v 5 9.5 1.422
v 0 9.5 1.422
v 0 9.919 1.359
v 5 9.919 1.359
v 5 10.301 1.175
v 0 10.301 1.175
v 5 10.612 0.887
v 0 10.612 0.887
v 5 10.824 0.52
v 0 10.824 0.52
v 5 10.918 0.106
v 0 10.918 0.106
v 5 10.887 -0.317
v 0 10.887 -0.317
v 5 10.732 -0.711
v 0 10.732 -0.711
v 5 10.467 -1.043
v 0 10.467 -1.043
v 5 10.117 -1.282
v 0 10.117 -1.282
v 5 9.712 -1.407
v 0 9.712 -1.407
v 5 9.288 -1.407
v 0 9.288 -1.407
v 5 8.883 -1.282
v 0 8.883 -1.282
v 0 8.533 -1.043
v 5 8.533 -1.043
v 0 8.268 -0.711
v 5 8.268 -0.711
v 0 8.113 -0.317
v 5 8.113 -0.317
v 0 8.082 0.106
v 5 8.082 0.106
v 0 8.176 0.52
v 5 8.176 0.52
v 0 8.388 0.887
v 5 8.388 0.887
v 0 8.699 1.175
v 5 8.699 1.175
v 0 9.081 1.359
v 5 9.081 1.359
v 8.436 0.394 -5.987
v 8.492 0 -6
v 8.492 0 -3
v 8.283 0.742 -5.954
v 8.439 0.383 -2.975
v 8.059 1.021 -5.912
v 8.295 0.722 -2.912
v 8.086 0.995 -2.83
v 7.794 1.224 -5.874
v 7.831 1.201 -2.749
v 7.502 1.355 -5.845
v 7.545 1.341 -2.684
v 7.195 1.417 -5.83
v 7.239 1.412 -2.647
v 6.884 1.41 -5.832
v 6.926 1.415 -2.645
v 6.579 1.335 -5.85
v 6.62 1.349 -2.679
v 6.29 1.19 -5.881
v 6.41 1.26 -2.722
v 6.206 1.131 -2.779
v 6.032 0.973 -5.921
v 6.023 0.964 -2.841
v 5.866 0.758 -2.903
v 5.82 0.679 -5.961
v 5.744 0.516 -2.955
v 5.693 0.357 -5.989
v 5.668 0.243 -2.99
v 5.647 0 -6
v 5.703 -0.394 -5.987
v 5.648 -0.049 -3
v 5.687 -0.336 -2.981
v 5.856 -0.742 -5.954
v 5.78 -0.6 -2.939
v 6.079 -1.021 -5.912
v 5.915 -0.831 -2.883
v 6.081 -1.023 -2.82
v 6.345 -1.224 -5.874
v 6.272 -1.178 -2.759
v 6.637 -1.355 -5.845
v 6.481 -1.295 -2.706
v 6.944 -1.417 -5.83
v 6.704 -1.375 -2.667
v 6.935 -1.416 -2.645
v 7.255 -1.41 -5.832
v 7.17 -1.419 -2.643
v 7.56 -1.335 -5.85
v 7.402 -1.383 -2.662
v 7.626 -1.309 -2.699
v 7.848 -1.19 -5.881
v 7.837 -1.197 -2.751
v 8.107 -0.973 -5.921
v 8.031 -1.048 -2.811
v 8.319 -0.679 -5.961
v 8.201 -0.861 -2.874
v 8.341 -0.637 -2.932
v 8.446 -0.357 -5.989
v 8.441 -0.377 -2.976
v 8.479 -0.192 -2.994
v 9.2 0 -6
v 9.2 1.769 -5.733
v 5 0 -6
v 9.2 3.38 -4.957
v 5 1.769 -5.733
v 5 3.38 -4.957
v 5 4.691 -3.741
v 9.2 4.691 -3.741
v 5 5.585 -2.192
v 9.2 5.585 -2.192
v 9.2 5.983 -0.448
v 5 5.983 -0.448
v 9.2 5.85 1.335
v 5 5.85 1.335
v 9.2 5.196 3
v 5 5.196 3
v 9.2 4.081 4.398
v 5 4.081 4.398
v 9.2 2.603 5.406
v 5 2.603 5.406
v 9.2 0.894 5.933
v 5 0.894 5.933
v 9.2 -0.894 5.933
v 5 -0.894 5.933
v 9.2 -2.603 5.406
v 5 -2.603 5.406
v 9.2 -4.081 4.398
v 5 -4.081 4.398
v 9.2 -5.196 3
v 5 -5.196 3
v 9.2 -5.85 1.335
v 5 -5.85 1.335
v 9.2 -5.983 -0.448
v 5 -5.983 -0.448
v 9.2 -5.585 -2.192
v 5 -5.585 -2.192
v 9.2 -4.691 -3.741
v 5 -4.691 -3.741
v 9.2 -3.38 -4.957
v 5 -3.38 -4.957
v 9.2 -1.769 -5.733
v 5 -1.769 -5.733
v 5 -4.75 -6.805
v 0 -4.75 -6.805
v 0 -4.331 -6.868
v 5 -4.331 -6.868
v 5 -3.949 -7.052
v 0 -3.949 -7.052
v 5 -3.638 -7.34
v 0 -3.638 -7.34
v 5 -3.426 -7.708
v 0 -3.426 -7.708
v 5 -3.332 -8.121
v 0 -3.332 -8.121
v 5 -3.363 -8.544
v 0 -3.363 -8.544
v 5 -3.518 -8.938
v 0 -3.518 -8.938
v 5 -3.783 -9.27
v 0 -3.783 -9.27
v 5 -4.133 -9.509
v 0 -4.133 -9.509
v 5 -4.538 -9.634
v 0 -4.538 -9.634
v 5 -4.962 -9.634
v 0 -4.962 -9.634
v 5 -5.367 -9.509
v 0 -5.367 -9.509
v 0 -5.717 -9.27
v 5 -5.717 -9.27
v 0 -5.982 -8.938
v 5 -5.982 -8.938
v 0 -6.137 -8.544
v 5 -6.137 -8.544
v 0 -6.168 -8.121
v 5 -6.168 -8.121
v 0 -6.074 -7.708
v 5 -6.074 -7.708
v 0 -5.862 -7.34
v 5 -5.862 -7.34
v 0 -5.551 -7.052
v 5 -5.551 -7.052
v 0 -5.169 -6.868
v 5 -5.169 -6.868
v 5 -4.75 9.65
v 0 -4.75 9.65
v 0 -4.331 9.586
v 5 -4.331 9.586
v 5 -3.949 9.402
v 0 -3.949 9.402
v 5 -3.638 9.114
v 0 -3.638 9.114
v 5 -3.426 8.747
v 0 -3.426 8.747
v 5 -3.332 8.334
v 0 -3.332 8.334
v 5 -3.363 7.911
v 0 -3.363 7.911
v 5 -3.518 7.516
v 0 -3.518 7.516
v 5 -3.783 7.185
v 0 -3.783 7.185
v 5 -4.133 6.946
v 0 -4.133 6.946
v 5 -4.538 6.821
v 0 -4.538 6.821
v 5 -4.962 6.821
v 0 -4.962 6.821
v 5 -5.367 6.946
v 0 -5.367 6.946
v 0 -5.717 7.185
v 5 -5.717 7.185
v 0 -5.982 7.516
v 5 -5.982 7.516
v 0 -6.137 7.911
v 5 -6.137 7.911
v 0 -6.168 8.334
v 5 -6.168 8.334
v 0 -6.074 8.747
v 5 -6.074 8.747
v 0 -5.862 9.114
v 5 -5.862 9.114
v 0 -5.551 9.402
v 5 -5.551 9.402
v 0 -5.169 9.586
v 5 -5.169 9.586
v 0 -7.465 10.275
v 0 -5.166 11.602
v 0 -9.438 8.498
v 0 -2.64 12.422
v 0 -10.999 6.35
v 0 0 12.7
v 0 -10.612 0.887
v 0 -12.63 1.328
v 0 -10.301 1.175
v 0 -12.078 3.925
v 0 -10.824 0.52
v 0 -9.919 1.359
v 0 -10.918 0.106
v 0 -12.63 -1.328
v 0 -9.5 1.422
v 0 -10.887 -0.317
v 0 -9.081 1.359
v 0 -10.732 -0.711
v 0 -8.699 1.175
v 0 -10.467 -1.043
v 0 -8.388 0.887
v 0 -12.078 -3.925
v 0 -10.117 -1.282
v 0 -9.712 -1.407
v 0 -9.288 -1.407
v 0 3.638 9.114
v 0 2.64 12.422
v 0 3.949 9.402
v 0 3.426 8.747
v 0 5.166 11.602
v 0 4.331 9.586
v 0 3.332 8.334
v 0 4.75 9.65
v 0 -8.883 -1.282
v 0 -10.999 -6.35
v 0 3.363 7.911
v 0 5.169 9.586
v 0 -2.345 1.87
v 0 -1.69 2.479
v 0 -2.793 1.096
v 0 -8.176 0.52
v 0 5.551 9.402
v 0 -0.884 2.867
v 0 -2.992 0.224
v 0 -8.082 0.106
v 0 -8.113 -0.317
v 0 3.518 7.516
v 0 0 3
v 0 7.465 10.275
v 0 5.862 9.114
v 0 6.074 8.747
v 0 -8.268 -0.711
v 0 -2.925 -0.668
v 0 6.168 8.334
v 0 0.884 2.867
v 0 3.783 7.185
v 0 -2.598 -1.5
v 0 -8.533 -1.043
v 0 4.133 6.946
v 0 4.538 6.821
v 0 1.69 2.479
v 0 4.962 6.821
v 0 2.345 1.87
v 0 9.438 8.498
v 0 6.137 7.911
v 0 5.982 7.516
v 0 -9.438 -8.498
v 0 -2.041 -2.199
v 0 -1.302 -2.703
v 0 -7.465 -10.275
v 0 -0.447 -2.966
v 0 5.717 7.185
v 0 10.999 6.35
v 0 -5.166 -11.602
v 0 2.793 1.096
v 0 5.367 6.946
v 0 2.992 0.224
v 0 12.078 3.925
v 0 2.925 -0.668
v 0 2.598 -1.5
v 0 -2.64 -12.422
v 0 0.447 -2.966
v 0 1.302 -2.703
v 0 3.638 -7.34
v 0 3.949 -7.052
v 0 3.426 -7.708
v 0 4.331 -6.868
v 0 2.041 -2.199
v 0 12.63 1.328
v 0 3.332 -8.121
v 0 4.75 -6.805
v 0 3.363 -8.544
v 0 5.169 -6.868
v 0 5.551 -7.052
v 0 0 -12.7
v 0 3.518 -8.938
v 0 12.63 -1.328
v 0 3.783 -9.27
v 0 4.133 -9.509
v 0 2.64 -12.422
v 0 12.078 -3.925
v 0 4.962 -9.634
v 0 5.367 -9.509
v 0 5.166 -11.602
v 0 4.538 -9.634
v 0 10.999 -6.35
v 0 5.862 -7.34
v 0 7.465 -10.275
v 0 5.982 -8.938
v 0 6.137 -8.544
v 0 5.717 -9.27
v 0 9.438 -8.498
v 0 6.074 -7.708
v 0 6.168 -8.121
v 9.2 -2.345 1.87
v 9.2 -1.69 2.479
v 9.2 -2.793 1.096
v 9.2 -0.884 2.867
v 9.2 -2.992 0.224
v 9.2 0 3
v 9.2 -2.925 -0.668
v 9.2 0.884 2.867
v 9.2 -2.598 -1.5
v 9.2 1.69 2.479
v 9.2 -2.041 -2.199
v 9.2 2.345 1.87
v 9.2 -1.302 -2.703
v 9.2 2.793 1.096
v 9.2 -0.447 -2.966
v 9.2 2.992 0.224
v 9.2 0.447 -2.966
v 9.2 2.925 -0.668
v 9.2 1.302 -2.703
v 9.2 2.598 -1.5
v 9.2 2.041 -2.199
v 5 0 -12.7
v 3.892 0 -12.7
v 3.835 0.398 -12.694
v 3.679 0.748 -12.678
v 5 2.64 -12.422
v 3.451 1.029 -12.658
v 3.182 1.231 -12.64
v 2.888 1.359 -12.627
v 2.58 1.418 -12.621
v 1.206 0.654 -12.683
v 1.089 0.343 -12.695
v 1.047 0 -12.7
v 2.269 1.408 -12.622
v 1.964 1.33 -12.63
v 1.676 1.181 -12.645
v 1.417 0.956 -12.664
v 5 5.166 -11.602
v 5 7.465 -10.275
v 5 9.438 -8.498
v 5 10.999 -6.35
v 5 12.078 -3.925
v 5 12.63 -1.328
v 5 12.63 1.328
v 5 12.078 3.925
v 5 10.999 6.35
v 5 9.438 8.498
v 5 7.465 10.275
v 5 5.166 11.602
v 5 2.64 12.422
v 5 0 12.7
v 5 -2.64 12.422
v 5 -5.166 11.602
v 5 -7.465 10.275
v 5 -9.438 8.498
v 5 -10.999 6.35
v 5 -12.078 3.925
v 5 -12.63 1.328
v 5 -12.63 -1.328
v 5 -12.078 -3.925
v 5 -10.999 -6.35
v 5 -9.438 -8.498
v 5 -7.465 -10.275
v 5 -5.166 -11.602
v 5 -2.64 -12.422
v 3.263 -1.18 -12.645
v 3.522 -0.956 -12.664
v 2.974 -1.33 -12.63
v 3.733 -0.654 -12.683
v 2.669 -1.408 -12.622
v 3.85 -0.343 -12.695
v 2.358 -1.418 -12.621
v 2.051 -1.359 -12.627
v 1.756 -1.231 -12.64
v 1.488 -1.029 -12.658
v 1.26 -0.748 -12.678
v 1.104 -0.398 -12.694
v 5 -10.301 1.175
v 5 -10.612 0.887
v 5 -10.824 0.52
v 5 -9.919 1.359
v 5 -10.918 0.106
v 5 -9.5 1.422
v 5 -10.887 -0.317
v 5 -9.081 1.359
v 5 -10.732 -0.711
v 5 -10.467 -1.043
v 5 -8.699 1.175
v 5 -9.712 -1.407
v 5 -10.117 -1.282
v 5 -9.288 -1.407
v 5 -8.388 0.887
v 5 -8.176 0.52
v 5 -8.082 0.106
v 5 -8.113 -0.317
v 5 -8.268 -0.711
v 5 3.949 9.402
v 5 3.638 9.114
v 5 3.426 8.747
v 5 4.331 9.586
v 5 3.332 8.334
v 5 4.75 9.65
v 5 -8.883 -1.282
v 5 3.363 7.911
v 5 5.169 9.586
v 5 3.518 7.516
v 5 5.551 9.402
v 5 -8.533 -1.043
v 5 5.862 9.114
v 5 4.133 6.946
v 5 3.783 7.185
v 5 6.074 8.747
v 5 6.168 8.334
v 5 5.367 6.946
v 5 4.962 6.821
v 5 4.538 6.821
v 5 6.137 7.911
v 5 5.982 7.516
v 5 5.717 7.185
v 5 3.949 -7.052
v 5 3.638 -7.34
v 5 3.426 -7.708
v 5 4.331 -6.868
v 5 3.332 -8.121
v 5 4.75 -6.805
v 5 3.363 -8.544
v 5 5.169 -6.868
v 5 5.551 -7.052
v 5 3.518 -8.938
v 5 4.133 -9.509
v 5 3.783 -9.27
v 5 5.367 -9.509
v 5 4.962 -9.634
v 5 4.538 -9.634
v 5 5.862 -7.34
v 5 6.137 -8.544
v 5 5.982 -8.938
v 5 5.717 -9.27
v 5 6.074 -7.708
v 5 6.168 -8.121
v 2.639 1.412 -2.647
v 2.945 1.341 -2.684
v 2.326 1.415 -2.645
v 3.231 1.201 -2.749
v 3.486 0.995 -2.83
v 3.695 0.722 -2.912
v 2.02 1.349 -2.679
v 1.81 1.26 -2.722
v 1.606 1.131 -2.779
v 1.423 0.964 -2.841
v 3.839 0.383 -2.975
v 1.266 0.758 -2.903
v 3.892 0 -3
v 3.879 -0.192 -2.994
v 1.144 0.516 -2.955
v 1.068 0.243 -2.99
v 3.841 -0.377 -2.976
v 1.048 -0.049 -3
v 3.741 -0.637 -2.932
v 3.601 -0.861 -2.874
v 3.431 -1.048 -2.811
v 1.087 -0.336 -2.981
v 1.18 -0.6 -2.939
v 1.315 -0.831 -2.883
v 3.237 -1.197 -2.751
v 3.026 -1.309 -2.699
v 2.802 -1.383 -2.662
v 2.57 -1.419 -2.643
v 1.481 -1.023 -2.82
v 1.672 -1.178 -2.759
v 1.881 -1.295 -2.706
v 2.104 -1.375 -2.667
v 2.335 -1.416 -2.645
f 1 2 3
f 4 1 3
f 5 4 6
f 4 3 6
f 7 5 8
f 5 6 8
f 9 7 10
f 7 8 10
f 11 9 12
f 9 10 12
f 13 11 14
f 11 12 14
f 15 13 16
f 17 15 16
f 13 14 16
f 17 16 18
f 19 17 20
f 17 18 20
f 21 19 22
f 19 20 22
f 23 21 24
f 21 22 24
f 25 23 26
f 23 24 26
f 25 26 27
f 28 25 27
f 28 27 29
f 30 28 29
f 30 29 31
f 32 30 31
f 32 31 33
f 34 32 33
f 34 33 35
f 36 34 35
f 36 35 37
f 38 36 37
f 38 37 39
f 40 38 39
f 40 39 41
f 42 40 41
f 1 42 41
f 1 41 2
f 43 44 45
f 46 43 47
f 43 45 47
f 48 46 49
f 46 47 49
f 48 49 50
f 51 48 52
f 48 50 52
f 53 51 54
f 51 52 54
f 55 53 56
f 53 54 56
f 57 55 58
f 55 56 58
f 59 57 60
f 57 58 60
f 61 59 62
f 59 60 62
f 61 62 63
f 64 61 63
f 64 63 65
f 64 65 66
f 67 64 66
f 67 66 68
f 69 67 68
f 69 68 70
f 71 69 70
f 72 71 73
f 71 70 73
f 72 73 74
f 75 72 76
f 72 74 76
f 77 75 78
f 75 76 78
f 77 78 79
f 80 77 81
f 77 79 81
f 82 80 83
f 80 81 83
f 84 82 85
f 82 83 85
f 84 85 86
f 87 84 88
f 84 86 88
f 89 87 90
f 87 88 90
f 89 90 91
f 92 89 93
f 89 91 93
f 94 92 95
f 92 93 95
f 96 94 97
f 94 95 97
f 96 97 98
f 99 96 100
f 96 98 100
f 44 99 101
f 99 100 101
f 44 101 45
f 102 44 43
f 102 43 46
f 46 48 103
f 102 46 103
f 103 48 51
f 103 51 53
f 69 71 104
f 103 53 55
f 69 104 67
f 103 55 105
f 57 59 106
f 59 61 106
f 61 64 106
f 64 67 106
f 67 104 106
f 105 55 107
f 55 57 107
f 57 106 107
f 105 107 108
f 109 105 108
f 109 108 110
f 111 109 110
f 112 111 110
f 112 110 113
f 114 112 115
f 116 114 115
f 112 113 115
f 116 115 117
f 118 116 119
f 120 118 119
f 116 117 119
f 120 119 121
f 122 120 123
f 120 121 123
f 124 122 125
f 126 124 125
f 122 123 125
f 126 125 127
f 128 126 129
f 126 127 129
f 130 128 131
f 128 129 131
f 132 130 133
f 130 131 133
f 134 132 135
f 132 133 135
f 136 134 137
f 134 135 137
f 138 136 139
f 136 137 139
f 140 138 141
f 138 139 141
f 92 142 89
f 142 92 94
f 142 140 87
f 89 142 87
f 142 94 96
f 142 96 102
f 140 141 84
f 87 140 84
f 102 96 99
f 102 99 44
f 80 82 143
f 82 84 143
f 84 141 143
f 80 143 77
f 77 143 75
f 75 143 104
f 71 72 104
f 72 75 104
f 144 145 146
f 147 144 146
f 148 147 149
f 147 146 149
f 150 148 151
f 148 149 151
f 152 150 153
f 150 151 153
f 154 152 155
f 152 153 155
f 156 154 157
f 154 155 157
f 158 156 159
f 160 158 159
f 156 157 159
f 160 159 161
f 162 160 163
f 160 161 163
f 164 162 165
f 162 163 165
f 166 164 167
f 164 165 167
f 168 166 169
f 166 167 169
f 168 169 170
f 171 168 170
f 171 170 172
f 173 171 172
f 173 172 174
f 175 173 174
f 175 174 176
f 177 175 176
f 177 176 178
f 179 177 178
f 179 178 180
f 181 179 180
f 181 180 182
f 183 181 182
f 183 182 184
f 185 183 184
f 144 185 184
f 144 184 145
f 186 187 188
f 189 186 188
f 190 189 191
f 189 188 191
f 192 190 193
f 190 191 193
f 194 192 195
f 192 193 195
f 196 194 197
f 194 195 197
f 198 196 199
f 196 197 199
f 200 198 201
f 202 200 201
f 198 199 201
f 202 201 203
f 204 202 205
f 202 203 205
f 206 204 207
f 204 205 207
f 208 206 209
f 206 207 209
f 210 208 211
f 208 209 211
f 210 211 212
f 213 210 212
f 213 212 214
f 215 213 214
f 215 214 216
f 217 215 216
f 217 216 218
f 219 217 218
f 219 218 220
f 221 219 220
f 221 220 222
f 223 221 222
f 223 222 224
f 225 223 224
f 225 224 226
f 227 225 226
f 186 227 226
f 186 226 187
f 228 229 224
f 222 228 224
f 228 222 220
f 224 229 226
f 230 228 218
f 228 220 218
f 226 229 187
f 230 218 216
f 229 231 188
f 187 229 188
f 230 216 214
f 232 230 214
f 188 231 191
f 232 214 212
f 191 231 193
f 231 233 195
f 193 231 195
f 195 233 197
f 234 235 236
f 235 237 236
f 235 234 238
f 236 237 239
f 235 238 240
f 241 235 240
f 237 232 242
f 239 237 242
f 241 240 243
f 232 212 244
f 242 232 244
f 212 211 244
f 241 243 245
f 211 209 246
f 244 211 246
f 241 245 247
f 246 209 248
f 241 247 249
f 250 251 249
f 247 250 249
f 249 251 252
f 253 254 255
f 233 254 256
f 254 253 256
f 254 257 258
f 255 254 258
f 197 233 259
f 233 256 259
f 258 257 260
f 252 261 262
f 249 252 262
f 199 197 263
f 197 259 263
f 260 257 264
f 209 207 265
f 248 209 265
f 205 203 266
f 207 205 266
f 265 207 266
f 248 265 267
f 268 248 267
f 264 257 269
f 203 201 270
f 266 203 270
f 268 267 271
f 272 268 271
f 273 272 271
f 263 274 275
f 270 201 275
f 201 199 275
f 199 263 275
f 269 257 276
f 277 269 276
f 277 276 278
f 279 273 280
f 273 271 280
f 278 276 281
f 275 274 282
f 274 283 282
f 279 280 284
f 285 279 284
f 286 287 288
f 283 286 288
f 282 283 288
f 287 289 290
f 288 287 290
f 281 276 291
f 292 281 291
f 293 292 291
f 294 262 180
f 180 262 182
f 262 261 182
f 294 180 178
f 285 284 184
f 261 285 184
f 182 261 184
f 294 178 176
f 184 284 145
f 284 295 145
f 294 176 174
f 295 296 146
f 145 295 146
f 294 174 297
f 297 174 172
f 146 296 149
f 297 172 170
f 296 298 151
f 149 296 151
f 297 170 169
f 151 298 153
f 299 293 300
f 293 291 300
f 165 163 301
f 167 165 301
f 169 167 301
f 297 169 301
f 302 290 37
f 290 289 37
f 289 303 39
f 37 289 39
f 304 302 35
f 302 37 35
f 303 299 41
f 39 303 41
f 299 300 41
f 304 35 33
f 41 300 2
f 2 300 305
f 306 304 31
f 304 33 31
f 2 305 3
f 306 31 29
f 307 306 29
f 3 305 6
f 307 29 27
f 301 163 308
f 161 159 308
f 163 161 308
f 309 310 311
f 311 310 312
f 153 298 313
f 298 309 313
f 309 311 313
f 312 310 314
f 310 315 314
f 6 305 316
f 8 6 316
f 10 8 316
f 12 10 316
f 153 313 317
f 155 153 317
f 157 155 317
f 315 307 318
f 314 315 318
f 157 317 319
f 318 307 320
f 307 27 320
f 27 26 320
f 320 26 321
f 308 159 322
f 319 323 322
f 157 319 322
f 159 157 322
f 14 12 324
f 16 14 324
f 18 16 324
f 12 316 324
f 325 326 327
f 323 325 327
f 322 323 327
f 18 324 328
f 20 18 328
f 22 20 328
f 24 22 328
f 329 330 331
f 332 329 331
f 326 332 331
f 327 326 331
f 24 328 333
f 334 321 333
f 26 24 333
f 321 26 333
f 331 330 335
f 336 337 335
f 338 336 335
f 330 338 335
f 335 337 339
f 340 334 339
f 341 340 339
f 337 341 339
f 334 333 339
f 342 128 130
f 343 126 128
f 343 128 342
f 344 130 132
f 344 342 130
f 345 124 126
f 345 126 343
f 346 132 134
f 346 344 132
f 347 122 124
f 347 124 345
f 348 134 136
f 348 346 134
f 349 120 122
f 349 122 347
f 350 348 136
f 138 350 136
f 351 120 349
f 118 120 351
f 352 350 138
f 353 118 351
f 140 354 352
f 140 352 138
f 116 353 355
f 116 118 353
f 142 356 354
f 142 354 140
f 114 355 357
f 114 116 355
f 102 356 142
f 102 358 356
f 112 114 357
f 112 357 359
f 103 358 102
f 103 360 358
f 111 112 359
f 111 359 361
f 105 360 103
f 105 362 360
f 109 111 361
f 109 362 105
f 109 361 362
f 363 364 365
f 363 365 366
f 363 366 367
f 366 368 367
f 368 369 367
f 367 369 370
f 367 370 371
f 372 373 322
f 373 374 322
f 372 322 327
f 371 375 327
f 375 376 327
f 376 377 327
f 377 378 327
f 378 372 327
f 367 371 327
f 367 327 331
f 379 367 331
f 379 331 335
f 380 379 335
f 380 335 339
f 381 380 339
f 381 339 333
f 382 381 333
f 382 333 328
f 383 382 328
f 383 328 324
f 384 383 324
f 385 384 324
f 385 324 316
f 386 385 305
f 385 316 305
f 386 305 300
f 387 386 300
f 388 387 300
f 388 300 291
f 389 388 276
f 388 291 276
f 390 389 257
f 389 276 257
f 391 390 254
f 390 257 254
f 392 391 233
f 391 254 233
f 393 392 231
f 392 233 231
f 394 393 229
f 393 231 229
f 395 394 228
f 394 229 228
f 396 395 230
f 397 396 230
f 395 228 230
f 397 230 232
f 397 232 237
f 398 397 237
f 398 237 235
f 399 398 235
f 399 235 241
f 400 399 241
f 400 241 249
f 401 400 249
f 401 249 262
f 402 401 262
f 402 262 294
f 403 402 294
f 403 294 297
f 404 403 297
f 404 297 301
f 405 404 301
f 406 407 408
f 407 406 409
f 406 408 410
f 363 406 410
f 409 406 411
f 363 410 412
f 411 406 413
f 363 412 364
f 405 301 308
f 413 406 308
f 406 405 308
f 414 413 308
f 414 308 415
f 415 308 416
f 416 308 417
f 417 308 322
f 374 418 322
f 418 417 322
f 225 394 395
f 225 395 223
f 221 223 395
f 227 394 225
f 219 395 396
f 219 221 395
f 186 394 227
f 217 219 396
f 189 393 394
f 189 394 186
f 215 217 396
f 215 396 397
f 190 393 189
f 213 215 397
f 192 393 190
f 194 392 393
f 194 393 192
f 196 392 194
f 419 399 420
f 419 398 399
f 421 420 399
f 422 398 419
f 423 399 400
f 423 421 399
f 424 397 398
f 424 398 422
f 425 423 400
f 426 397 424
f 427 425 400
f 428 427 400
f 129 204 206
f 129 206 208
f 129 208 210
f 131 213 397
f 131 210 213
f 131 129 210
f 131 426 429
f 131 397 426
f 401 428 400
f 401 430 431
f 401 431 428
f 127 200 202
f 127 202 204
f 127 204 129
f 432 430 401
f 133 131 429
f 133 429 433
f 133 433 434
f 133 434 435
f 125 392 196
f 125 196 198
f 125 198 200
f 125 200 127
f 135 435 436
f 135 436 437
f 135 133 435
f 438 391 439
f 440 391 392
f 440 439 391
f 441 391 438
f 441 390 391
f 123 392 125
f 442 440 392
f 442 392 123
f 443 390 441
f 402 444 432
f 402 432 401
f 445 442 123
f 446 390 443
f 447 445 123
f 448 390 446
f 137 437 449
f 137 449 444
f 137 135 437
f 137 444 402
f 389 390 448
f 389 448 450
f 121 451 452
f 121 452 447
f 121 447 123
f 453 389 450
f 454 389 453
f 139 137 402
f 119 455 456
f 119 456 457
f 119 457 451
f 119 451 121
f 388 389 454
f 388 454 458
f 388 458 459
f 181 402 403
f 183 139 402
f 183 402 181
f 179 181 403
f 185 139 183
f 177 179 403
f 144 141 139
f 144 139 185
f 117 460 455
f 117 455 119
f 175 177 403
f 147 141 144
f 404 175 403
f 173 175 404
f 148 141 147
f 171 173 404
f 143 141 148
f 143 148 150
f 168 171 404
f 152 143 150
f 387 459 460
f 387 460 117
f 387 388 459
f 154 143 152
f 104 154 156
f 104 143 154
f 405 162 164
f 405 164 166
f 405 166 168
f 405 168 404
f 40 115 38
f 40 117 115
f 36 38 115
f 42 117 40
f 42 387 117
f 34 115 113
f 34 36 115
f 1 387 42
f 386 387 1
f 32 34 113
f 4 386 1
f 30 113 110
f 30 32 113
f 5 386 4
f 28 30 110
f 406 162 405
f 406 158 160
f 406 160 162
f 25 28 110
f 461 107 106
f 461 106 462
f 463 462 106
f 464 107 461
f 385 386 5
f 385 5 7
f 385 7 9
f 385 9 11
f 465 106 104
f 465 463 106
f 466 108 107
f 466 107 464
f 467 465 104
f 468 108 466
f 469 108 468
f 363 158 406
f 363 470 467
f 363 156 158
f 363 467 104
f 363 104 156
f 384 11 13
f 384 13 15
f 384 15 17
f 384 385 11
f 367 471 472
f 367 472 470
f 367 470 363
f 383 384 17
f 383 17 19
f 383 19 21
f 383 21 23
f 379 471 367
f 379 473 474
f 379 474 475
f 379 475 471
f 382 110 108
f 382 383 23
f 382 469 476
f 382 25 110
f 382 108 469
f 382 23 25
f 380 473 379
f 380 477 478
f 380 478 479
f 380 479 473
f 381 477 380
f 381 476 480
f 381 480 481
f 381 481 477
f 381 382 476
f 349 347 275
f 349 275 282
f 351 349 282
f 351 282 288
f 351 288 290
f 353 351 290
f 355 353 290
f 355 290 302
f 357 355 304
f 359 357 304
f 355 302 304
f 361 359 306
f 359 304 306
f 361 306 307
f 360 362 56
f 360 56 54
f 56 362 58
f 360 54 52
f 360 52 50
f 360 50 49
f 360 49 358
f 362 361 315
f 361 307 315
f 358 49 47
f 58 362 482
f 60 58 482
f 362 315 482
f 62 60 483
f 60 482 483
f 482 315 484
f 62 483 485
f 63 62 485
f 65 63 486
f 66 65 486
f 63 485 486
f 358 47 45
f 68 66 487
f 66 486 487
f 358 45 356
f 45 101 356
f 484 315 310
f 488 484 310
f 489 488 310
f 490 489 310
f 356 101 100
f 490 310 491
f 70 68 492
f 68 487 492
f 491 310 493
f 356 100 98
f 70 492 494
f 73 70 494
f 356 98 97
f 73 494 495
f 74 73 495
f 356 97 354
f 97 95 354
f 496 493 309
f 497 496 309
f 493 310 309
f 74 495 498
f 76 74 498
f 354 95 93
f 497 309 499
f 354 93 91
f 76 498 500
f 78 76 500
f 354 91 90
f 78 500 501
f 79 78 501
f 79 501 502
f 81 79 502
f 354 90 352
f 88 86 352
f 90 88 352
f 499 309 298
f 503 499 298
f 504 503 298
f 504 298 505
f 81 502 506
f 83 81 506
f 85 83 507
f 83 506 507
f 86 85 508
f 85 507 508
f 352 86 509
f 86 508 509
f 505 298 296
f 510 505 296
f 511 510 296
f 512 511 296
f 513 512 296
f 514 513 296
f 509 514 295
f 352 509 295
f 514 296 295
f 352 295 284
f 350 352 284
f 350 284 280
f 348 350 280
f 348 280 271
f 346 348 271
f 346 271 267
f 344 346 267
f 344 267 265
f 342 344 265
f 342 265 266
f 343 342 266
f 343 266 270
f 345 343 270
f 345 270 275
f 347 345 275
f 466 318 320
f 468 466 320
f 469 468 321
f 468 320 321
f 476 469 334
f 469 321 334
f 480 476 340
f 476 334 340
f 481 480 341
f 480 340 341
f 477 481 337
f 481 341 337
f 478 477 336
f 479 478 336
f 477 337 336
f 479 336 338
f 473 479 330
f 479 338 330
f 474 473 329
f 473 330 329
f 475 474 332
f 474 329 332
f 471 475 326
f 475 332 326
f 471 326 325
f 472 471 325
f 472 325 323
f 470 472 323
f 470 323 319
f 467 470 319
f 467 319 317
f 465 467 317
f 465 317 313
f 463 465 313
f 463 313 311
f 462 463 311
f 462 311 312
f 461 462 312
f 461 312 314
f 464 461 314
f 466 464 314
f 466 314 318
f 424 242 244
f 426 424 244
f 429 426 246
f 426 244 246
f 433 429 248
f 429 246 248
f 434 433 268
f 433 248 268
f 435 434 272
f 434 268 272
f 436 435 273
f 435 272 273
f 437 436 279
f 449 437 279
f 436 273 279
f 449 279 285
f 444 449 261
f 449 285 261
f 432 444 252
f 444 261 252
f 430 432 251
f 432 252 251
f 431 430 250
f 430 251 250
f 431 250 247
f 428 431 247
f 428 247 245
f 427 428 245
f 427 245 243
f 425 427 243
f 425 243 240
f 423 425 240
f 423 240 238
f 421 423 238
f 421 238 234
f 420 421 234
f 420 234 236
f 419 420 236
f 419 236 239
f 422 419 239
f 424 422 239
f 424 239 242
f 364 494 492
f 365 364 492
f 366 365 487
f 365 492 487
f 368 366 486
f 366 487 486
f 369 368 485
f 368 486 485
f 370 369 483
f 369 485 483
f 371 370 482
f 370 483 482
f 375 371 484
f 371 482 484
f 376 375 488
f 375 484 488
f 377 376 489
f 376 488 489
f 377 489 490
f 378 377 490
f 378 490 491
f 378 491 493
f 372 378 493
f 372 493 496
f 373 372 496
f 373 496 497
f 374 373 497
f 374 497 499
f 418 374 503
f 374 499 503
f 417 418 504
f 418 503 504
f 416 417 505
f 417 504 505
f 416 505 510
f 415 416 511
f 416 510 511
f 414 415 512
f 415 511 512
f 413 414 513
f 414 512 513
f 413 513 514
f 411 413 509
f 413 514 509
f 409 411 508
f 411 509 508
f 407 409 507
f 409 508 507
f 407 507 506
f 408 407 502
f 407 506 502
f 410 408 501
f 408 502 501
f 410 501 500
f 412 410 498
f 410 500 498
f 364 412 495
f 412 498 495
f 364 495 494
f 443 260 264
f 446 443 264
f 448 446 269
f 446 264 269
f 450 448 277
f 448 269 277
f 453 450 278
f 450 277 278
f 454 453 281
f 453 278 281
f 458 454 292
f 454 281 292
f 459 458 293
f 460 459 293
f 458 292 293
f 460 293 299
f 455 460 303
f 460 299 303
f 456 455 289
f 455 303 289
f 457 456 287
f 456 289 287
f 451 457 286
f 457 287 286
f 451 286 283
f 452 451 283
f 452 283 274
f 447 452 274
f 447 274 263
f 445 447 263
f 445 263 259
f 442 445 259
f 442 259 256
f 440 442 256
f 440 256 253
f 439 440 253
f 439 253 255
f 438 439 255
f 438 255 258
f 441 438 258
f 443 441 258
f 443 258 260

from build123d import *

# Parameters (mm, degrees)
SKETCH1_R           = 12.7
BOSS_EXTRUDE1_DEPTH = 9.2
CUT_EXTRUDE1_START  = -4.2
SKETCH2_R           = 12.7
SKETCH2_R_2         = 6
CUT_EXTRUDE1_DEPTH  = 4.2
SKETCH4_R           = 3
SKETCH4_R_2         = 1.4224
CUT_EXTRUDE2_DEPTH  = 21.179692763
SKETCH5_R           = 1.4224
CUT_EXTRUDE3_DEPTH  = 21.179692763


with BuildPart() as part:
    # Sketch1 → Boss-Extrude1 (new body)
    with BuildSketch(Plane(origin=(0, 0, 0), x_dir=(0, 0, -1), z_dir=(1, 0, 0))):
        Circle(SKETCH1_R)
    extrude(amount=BOSS_EXTRUDE1_DEPTH)

    # Sketch2 → Cut-Extrude1 (cut)
    with BuildSketch(Plane(origin=(9.2, 0, 0), x_dir=(0, 0, -1), z_dir=(1, 0, 0)).offset(CUT_EXTRUDE1_START)):
        Circle(SKETCH2_R)
        Circle(SKETCH2_R_2, mode=Mode.SUBTRACT)
    extrude(amount=CUT_EXTRUDE1_DEPTH, mode=Mode.SUBTRACT)

    # Sketch4 → Cut-Extrude2 (cut, through all)
    with BuildSketch(Plane.ZY):
        Circle(SKETCH4_R)
        with Locations((-8.227241336, -4.75)):
            Circle(SKETCH4_R_2)
        with Locations((8.227241336, 4.75)):
            Circle(SKETCH4_R_2)
        with Locations((-8.227241336, 4.75)):
            Circle(SKETCH4_R_2)
        with Locations((0, 9.5)):
            Circle(SKETCH4_R_2)
        with Locations((0, -9.5)):
            Circle(SKETCH4_R_2)
        with Locations((8.227241336, -4.75)):
            Circle(SKETCH4_R_2)
    extrude(amount=-CUT_EXTRUDE2_DEPTH, mode=Mode.SUBTRACT)

    # Sketch5 → Cut-Extrude3 (cut, through all)
    with BuildSketch(Plane.XY):
        with Locations((2.469287496, 0)):
            Circle(SKETCH5_R)
        with Locations((7.069287496, 0)):
            Circle(SKETCH5_R)
    extrude(amount=-CUT_EXTRUDE3_DEPTH, mode=Mode.SUBTRACT)


solid = part.part
